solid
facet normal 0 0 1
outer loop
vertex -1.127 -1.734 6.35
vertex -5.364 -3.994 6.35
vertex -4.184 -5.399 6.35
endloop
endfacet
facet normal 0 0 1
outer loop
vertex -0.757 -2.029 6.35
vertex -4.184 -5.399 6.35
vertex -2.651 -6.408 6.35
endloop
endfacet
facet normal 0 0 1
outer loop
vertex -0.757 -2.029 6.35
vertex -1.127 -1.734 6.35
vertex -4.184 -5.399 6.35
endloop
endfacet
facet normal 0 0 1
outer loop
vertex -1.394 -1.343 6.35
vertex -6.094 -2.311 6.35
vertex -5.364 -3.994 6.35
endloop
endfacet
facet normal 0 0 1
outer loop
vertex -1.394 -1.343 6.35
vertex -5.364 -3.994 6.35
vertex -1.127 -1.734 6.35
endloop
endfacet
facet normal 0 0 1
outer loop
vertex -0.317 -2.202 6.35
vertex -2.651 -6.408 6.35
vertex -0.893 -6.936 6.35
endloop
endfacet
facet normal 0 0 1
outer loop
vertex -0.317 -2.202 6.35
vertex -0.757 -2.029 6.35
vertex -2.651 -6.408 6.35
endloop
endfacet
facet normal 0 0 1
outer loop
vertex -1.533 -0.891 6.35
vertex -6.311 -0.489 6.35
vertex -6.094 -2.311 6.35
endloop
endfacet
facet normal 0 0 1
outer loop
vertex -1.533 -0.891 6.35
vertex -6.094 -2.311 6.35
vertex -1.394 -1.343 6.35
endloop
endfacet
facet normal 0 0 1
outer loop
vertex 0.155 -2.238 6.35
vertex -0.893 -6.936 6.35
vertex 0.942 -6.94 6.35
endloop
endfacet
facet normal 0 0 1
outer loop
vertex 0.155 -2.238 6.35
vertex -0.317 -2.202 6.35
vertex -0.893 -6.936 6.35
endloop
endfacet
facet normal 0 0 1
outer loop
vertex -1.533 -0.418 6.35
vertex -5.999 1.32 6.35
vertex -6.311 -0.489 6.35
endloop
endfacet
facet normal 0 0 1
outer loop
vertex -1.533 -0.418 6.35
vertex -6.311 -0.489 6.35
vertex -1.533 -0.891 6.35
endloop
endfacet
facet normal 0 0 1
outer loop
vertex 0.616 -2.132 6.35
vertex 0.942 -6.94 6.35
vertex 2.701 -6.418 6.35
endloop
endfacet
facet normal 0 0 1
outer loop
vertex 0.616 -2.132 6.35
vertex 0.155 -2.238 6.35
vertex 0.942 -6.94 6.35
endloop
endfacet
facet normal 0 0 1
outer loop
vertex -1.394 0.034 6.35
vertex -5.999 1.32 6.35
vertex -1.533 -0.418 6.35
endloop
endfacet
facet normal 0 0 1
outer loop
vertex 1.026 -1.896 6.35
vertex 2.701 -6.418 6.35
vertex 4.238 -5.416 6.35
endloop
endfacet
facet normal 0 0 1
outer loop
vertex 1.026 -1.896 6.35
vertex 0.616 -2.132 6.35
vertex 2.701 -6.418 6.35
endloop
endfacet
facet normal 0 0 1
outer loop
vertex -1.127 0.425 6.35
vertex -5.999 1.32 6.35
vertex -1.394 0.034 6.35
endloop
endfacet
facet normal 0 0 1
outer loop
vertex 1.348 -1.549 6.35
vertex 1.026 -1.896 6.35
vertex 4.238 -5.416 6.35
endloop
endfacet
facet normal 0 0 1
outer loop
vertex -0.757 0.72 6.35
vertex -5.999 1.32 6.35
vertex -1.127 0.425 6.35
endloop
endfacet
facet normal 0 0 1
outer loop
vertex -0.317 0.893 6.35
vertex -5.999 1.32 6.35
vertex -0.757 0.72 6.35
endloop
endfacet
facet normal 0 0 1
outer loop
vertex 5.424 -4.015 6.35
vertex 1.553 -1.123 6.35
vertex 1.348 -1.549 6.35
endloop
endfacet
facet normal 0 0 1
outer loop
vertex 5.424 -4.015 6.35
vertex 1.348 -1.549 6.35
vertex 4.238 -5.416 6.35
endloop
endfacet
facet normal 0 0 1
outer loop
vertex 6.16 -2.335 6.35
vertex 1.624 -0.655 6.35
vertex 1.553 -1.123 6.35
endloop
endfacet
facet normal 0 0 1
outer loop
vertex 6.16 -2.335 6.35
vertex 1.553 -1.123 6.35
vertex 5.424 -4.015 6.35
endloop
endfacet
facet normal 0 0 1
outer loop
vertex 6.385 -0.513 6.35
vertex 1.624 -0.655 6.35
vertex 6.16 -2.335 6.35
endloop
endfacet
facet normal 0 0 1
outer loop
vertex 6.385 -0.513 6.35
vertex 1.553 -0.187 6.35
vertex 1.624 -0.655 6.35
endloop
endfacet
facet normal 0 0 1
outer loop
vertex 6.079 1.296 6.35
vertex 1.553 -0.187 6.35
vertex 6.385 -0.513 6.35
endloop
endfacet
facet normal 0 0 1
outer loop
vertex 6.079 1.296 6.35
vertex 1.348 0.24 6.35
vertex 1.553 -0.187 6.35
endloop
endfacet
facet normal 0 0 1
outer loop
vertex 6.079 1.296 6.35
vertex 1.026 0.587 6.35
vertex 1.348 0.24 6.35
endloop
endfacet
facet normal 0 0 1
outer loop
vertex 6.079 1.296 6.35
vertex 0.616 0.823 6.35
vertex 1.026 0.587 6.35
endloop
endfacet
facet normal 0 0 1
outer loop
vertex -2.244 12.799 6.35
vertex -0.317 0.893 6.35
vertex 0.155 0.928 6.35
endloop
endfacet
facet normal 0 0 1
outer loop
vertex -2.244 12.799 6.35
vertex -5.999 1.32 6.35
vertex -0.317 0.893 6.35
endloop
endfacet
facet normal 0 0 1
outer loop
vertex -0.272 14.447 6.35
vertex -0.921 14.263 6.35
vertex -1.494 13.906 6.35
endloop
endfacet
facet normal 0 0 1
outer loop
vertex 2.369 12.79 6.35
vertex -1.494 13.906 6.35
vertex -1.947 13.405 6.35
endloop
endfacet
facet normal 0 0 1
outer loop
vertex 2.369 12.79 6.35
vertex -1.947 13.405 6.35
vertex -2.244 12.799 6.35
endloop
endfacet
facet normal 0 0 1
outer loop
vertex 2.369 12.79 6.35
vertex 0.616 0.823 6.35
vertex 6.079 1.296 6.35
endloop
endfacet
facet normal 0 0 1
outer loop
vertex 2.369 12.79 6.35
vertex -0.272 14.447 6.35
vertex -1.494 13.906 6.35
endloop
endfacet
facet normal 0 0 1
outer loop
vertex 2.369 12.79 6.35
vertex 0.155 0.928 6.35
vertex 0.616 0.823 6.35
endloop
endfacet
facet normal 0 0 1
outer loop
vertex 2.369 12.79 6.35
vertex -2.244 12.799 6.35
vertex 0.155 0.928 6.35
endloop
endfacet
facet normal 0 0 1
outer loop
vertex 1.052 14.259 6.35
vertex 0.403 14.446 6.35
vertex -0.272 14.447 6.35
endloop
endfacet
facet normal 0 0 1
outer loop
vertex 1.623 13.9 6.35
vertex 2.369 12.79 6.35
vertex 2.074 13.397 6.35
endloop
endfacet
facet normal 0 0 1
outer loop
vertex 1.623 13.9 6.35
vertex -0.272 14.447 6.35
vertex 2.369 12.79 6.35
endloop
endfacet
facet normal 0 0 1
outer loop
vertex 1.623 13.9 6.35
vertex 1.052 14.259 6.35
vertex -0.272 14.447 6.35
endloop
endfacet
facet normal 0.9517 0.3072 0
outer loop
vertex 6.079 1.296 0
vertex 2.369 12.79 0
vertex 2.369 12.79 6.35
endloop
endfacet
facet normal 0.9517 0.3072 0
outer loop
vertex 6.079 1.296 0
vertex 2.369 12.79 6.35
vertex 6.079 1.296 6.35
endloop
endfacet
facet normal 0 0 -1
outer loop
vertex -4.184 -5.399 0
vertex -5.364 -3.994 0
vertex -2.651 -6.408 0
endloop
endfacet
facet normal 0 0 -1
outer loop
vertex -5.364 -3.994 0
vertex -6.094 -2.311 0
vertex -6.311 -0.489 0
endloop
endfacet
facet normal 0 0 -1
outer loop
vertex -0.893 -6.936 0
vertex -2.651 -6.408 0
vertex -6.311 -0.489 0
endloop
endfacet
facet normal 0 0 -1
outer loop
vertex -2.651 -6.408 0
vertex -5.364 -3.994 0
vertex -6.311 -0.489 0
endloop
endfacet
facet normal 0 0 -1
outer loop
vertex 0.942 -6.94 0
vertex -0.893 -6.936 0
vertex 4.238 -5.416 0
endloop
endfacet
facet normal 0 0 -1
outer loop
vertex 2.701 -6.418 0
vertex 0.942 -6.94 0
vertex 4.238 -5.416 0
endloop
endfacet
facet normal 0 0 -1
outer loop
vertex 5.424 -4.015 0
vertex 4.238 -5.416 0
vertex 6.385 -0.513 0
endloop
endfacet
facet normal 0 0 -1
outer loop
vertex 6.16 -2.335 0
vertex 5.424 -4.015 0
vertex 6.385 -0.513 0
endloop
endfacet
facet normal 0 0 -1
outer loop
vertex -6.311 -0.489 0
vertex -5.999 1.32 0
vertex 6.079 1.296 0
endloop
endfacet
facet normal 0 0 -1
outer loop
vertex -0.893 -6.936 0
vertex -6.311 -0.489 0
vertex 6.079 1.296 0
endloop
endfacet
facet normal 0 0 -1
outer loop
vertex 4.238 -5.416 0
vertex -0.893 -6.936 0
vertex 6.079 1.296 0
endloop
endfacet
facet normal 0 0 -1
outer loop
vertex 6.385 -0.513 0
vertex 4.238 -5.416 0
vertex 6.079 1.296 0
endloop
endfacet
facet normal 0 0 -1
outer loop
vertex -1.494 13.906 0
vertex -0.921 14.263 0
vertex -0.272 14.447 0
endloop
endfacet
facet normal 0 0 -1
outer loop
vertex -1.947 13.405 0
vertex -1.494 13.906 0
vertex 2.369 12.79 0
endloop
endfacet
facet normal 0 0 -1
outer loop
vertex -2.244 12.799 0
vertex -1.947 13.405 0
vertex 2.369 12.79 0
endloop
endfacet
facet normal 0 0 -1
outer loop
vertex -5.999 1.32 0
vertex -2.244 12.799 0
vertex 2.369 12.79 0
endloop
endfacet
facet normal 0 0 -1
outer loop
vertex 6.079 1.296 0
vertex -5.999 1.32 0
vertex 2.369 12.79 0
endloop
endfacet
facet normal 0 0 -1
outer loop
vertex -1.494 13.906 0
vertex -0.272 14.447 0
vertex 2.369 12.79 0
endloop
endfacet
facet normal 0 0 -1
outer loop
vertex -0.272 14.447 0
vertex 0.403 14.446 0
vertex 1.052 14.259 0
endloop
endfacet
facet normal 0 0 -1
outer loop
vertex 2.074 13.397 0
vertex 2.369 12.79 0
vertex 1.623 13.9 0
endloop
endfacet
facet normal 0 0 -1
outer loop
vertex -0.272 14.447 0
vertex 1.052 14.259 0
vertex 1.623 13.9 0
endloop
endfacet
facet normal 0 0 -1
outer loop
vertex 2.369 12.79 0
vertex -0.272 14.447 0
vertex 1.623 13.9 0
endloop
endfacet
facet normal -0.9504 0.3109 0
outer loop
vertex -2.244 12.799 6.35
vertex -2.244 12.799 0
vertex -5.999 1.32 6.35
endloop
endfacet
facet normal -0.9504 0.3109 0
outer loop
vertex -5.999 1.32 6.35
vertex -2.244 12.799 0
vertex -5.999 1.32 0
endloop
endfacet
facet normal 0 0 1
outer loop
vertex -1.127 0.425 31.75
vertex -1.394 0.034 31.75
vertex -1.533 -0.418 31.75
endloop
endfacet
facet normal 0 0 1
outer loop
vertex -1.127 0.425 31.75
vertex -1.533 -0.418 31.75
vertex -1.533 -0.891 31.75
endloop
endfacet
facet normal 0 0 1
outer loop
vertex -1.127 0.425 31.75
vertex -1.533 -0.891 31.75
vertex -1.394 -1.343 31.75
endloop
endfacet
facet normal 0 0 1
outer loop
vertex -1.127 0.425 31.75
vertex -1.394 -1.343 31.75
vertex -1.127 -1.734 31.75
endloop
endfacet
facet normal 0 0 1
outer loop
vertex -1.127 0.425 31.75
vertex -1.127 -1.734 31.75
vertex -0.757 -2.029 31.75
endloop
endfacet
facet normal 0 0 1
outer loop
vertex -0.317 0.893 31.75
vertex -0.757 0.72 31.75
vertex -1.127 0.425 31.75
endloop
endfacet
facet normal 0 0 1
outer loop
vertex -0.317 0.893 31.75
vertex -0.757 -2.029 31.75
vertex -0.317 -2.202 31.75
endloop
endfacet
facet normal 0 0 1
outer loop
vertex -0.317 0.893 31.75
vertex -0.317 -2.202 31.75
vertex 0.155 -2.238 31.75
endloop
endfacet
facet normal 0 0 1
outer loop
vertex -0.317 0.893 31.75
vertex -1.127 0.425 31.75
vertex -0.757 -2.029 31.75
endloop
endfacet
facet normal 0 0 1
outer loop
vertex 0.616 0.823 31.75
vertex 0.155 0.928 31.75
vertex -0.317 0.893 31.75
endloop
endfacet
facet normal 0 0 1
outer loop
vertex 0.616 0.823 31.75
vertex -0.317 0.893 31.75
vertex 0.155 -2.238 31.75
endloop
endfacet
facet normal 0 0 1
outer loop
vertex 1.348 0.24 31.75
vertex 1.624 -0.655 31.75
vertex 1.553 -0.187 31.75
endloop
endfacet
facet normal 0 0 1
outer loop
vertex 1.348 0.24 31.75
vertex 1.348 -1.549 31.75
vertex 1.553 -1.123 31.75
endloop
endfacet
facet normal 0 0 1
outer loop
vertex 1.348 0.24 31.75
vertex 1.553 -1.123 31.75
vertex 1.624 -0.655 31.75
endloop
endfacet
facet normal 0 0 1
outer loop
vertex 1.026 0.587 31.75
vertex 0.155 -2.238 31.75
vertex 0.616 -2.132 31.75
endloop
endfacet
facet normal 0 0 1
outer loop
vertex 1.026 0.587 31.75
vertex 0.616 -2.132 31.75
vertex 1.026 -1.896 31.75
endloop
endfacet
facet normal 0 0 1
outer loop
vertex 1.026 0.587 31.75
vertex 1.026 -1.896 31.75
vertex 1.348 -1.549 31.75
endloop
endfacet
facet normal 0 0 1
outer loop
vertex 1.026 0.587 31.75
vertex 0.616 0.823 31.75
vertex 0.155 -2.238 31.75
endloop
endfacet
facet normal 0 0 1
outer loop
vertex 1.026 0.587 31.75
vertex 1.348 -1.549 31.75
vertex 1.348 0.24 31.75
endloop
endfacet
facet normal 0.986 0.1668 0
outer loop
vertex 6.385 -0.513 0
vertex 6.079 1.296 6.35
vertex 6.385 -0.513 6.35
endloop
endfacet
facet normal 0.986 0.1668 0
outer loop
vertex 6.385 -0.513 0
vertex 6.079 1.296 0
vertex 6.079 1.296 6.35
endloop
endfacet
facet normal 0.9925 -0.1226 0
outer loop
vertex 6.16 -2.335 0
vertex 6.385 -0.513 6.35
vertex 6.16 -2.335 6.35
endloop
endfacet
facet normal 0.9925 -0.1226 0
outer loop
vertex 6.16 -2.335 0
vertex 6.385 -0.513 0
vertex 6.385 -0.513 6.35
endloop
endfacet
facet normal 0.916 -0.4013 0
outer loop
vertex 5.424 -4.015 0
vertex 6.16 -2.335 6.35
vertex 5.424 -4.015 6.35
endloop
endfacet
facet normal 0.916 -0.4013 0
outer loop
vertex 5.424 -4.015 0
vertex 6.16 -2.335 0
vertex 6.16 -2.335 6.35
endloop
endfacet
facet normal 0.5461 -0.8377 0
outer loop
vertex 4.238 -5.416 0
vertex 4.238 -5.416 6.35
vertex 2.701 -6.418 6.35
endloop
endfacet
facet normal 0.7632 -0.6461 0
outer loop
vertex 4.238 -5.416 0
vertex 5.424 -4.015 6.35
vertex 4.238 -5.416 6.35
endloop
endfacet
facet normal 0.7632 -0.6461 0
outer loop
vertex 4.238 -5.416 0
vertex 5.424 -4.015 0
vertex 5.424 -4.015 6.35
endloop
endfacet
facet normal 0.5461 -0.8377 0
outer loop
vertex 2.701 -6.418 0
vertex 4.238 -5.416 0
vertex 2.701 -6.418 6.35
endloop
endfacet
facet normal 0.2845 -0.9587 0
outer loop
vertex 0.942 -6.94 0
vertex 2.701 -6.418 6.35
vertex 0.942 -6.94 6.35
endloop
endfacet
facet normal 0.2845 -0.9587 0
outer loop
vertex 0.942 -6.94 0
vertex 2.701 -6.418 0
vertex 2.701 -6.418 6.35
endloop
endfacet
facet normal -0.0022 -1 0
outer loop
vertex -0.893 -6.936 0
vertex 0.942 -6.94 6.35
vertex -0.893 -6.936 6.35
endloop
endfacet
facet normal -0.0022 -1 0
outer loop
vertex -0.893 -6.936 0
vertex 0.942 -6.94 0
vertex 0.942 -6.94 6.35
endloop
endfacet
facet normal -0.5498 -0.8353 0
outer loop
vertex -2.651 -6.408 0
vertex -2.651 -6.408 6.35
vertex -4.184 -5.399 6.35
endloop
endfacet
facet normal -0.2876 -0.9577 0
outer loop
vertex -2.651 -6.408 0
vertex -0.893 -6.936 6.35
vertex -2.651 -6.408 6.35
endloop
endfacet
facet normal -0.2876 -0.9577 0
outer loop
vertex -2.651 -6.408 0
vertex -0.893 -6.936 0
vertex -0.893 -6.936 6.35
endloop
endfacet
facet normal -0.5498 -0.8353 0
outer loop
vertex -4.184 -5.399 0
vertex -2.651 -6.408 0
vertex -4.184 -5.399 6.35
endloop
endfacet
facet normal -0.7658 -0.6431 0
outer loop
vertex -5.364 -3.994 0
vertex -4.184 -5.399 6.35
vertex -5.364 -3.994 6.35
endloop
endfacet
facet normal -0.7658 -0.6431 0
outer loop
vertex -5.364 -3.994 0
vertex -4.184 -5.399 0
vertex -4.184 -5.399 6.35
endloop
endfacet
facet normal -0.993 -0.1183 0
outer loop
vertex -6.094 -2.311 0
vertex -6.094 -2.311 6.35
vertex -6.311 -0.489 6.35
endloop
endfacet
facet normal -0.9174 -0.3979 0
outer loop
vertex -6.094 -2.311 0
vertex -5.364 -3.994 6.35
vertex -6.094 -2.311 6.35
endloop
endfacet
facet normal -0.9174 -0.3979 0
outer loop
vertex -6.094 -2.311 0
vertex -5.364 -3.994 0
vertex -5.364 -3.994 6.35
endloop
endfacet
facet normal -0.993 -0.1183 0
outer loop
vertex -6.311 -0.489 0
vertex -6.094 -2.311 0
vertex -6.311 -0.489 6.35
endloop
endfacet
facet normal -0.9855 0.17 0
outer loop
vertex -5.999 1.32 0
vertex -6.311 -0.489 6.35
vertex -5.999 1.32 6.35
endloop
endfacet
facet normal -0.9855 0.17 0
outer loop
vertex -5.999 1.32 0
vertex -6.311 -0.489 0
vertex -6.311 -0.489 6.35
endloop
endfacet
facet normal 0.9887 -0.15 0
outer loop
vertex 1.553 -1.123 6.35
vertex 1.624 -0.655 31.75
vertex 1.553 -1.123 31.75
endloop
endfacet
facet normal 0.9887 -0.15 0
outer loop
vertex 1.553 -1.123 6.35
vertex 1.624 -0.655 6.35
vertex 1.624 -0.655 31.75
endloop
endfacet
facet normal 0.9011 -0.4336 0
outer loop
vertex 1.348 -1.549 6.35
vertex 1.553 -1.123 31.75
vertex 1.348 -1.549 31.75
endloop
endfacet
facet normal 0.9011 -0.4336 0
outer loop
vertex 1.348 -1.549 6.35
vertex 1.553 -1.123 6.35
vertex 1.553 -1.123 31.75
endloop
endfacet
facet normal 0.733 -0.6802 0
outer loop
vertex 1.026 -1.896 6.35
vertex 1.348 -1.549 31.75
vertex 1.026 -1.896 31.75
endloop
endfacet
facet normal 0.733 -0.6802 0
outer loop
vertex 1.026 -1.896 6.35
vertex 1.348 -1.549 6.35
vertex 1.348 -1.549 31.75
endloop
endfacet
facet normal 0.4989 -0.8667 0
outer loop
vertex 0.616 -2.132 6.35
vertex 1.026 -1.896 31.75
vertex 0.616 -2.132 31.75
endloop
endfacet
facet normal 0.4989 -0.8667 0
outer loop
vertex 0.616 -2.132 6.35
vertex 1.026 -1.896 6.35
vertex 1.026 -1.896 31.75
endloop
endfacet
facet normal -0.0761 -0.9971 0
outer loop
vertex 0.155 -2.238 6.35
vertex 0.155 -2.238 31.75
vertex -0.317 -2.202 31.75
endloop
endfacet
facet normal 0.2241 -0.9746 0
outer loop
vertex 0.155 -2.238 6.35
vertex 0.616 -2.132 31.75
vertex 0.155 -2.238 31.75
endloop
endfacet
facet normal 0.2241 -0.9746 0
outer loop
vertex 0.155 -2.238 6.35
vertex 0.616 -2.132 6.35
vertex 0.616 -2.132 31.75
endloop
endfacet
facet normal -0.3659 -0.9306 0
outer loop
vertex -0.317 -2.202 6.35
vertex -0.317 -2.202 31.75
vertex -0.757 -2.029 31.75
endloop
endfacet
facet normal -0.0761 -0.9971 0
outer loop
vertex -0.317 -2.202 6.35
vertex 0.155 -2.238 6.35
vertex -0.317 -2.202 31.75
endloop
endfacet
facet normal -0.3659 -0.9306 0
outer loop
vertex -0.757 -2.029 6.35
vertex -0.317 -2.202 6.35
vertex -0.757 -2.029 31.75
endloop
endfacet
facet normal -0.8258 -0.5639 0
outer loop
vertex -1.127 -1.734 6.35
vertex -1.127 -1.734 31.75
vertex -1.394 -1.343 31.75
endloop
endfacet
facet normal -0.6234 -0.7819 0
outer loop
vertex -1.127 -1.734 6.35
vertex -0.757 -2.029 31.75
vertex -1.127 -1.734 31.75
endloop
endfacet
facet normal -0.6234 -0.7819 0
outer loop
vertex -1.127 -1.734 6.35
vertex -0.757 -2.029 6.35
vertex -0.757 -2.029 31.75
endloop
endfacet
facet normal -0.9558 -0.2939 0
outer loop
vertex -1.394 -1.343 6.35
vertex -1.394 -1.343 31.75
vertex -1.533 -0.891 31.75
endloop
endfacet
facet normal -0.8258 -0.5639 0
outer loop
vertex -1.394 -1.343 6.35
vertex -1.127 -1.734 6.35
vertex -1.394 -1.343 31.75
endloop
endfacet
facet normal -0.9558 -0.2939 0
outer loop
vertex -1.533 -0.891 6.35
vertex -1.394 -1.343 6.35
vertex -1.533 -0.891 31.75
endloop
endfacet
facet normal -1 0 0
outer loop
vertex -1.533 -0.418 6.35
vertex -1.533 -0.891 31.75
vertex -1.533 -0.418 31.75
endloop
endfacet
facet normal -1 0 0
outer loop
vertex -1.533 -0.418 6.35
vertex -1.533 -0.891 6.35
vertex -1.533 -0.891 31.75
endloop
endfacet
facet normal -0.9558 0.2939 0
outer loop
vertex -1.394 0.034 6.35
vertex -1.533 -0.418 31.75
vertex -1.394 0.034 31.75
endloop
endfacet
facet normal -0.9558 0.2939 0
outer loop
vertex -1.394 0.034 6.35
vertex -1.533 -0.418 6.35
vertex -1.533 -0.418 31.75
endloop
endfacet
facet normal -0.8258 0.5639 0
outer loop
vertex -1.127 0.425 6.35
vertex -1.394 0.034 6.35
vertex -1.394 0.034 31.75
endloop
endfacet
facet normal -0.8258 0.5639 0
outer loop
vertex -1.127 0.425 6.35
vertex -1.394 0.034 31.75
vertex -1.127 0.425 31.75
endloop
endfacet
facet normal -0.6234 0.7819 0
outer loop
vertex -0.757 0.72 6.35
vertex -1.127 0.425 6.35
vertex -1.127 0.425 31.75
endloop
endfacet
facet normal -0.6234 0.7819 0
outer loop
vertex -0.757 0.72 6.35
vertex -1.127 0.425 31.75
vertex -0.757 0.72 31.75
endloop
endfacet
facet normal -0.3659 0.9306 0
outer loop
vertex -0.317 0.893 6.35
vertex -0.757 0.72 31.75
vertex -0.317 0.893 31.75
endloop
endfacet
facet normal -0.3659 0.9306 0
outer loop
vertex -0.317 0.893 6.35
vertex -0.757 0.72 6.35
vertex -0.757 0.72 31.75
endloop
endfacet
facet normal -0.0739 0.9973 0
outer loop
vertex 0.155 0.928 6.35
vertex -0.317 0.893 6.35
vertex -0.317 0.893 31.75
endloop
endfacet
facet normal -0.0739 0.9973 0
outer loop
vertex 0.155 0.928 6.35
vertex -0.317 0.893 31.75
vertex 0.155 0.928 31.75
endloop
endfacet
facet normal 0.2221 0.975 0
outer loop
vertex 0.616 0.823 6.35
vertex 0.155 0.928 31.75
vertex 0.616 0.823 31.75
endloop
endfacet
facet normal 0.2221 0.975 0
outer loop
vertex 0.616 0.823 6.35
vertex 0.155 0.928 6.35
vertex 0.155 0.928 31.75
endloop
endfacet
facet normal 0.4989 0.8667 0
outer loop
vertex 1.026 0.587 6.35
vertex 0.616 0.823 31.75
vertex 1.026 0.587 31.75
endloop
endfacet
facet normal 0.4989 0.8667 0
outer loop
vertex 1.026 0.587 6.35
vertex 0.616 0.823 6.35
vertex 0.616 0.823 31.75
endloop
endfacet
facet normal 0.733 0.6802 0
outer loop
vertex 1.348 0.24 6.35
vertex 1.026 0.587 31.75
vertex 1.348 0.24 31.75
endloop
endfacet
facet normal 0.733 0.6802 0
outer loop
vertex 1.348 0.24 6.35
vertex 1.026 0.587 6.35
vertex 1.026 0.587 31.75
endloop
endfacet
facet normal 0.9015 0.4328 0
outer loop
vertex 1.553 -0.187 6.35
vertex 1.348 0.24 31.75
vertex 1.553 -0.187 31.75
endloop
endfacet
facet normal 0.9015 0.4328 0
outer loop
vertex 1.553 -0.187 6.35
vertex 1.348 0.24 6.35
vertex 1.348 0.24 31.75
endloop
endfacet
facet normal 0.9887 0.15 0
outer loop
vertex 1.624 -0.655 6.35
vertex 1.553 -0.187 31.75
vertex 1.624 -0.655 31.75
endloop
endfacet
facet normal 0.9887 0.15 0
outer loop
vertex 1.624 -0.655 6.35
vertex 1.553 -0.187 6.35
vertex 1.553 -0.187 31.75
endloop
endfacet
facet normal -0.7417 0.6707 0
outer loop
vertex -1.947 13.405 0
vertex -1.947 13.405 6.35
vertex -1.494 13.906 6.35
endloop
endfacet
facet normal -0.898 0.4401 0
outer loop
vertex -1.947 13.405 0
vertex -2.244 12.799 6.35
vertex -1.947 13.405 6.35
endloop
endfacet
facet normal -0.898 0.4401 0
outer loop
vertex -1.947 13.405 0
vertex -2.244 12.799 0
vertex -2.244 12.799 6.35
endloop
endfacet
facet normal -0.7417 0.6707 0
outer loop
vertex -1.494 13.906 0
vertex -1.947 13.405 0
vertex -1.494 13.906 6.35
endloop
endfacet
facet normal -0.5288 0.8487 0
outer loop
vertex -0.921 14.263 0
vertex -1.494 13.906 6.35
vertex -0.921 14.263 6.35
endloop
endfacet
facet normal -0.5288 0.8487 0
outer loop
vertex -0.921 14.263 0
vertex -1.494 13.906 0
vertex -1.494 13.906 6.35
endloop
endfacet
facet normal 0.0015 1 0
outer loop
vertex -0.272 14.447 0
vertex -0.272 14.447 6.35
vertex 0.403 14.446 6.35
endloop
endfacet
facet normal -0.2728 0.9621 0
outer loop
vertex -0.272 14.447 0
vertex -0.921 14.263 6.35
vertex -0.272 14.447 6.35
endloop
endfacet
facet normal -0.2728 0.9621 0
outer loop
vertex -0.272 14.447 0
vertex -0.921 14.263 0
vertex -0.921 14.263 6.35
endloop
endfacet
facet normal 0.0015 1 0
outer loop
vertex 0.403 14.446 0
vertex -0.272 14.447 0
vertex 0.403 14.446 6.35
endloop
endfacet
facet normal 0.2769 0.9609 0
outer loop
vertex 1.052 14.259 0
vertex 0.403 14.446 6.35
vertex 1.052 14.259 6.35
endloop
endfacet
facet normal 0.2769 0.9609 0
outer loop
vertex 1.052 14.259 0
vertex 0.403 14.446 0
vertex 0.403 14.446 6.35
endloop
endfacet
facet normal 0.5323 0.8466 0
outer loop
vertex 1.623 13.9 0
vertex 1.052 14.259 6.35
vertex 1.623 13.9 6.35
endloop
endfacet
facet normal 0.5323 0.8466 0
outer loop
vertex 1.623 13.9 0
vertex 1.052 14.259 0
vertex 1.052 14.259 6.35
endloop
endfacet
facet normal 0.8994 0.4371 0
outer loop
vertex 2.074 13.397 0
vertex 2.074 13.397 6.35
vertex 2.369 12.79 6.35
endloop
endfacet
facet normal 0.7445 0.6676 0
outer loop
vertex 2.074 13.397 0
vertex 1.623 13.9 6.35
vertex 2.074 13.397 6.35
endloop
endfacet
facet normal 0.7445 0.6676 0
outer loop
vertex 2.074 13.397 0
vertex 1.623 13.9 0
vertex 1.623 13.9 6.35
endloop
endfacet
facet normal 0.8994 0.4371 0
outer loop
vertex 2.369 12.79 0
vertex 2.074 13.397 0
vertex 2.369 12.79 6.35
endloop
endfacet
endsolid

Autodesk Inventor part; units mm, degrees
ref_plane "YZ Plane" through (0, 0, 0) normal (1, 0, 0) x (0, 1, 0)
ref_plane "XZ Plane" through (0, 0, 0) normal (0, 1, 0) x (-1, 0, 0)
ref_plane "XY Plane" through (0, 0, 0) normal (0, 0, 1) x (1, 0, 0)
sketch "Sketch1" plane through (0, 0, 0) normal (0, 0, 1) x (1, 0, 0)
  arc A0 (-5.9989, 1.3197) -> (6.0793, 1.2962) centre (0.0364, -0.6546) ccw
  arc A1 (2.3687, 12.7903) -> (-2.2437, 12.7993) centre (0.0611, 12.0454) ccw
  line L0 (-2.2437, 12.7993) -> (-5.9989, 1.3197)
  line L1 (2.3687, 12.7903) -> (6.0793, 1.2962)
  dimension "d0" = 12.7
  dimension "d8" = 12.7
extrude "Extrusion1" add sketch "Sketch1" along normal blind 6.35
sketch "Sketch2" plane through (0, 0, 6.35) normal (0, 0, 1) x (1, 0, 0)
  arc A0 (-5.2619, 3.4373) -> (5.5303, 3.1215) centre (0.0364, -0.6546) ccw projected
  circle A1 centre (0.0364, -0.6546) radius 1.5875
  dimension "d4" = 3.175
extrude "Extrusion2" add sketch "Sketch2" along normal blind 25.4
properties part number "cam"
